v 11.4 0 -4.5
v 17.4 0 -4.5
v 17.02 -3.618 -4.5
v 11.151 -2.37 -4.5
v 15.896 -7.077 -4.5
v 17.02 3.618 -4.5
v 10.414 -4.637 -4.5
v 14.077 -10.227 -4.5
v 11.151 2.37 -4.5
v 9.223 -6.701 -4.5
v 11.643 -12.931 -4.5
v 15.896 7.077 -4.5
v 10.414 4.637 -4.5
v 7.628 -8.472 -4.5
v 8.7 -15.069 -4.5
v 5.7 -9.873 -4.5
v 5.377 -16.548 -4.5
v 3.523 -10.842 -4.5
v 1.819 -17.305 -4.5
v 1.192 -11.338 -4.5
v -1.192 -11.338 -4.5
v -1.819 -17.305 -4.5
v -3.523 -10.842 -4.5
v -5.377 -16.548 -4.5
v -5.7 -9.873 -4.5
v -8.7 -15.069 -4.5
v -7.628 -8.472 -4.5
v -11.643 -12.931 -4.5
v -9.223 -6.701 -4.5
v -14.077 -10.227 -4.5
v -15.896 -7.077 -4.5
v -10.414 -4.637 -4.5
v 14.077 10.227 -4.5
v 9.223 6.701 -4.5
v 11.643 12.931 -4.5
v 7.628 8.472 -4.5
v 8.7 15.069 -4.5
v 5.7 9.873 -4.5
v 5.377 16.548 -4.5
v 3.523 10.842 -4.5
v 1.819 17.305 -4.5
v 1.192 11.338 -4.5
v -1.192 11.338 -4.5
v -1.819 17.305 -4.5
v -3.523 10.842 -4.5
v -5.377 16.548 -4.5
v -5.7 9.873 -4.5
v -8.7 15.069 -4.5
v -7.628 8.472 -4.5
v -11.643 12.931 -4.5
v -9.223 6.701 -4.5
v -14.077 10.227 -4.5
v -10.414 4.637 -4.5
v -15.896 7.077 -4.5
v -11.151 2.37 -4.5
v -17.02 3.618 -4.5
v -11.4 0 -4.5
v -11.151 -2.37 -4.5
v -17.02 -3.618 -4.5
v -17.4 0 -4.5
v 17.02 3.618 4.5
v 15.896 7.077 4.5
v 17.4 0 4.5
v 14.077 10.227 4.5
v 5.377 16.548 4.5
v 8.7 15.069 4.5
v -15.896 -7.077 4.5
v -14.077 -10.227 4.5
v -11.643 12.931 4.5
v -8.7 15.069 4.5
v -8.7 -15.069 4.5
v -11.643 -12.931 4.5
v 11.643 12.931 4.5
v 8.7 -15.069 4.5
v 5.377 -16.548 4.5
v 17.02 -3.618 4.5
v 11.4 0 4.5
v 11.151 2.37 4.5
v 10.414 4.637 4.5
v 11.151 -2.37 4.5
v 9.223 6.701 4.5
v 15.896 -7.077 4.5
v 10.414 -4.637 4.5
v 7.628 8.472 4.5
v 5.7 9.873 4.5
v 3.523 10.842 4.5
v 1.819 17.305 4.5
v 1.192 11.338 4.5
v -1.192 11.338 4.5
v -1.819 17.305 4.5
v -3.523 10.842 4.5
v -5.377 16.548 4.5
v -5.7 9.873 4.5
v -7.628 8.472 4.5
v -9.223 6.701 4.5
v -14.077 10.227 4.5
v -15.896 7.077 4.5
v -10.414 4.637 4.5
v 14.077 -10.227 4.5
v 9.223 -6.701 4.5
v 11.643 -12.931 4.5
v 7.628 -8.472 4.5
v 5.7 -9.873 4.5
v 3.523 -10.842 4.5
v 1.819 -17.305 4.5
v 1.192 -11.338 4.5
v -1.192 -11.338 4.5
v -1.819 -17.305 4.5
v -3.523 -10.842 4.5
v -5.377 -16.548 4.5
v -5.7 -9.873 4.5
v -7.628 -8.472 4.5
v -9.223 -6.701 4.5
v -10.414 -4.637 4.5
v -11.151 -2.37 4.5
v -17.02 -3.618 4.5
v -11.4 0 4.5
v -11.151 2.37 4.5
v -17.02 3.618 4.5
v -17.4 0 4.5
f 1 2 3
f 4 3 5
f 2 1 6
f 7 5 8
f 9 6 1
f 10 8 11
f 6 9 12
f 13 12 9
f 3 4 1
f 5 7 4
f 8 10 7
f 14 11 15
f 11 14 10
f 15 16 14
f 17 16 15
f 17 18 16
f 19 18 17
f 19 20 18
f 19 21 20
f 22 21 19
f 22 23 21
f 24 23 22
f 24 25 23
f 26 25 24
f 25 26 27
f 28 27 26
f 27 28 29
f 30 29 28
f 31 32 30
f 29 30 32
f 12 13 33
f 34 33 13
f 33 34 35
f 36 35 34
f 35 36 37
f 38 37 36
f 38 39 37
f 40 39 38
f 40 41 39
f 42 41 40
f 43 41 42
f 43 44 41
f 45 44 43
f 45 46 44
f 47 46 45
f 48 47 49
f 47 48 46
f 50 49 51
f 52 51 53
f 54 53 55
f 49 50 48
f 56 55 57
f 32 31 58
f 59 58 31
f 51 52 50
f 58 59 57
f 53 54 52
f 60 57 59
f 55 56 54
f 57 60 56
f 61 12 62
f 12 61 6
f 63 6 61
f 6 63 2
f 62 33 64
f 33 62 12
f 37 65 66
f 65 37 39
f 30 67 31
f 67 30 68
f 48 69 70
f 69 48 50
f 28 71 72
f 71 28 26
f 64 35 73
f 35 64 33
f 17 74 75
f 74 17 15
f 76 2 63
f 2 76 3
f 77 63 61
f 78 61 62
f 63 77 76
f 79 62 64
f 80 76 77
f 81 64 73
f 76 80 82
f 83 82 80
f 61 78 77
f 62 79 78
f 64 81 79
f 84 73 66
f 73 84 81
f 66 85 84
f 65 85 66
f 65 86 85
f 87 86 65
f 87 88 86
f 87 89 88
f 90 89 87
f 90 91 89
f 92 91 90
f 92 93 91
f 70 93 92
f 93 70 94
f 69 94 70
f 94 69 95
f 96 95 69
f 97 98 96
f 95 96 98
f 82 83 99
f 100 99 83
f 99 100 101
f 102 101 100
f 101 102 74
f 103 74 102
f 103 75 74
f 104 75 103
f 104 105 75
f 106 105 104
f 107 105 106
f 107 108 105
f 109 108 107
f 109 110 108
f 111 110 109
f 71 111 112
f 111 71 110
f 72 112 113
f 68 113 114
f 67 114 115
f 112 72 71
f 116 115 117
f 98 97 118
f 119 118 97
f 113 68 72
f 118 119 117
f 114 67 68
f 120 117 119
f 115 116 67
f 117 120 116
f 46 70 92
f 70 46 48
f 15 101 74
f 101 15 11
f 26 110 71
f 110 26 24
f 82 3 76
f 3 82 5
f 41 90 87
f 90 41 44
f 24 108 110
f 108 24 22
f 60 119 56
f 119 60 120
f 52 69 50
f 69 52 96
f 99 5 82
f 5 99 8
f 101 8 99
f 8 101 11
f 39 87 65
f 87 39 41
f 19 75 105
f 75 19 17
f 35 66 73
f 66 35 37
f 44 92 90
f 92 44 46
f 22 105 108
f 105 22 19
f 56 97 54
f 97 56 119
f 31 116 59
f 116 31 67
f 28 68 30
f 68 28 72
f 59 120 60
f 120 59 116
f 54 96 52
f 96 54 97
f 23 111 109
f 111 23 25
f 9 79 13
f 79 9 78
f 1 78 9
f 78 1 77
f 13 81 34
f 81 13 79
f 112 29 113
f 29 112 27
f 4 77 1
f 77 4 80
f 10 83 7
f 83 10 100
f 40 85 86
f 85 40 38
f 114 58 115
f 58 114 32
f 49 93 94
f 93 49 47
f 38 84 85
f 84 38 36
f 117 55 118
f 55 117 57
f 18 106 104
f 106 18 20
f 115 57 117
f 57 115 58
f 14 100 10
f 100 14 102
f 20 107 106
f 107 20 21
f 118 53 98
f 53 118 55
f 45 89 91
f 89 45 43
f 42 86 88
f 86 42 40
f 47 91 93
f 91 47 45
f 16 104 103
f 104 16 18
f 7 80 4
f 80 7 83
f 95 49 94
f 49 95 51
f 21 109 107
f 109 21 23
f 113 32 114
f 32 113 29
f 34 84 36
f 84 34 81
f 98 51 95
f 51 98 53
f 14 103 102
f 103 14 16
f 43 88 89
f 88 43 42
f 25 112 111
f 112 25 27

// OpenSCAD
// Parameters
outer_radius = 17.4; //[8.7:34.8:0.1]
inner_radius = 11.4; //[5.7:22.8:0.1]
height = 9; //[4.5:18:0.1]
rim_thickness = 0.5; //[0.25:1:0.05]
overlap = 1; //[0.5:2:0.1]

// Base Shapes
module annular_outer_cyl() {
  cylinder(r=outer_radius, h=height, center=true);
}

module annular_inner_hole_cyl() {
  cylinder(r=inner_radius, h=height + 2*overlap, center=true);
}

module rim_outer_cyl() {
  cylinder(r=outer_radius, h=height, center=true);
}

module rim_inner_cut_cyl() {
  cylinder(r=outer_radius - rim_thickness, h=height + 2*overlap, center=true);
}

// Operations
module annular_main_body() {
  difference() {
    annular_outer_cyl();
    annular_inner_hole_cyl();
  }
}

module rim_or_lip_feature() {
  difference() {
    rim_outer_cyl();
    rim_inner_cut_cyl();
  }
}

// Final Output
module complete_model() {
  union() {
    annular_main_body();
    rim_or_lip_feature();
  }
}

// Render the complete model
complete_model();
